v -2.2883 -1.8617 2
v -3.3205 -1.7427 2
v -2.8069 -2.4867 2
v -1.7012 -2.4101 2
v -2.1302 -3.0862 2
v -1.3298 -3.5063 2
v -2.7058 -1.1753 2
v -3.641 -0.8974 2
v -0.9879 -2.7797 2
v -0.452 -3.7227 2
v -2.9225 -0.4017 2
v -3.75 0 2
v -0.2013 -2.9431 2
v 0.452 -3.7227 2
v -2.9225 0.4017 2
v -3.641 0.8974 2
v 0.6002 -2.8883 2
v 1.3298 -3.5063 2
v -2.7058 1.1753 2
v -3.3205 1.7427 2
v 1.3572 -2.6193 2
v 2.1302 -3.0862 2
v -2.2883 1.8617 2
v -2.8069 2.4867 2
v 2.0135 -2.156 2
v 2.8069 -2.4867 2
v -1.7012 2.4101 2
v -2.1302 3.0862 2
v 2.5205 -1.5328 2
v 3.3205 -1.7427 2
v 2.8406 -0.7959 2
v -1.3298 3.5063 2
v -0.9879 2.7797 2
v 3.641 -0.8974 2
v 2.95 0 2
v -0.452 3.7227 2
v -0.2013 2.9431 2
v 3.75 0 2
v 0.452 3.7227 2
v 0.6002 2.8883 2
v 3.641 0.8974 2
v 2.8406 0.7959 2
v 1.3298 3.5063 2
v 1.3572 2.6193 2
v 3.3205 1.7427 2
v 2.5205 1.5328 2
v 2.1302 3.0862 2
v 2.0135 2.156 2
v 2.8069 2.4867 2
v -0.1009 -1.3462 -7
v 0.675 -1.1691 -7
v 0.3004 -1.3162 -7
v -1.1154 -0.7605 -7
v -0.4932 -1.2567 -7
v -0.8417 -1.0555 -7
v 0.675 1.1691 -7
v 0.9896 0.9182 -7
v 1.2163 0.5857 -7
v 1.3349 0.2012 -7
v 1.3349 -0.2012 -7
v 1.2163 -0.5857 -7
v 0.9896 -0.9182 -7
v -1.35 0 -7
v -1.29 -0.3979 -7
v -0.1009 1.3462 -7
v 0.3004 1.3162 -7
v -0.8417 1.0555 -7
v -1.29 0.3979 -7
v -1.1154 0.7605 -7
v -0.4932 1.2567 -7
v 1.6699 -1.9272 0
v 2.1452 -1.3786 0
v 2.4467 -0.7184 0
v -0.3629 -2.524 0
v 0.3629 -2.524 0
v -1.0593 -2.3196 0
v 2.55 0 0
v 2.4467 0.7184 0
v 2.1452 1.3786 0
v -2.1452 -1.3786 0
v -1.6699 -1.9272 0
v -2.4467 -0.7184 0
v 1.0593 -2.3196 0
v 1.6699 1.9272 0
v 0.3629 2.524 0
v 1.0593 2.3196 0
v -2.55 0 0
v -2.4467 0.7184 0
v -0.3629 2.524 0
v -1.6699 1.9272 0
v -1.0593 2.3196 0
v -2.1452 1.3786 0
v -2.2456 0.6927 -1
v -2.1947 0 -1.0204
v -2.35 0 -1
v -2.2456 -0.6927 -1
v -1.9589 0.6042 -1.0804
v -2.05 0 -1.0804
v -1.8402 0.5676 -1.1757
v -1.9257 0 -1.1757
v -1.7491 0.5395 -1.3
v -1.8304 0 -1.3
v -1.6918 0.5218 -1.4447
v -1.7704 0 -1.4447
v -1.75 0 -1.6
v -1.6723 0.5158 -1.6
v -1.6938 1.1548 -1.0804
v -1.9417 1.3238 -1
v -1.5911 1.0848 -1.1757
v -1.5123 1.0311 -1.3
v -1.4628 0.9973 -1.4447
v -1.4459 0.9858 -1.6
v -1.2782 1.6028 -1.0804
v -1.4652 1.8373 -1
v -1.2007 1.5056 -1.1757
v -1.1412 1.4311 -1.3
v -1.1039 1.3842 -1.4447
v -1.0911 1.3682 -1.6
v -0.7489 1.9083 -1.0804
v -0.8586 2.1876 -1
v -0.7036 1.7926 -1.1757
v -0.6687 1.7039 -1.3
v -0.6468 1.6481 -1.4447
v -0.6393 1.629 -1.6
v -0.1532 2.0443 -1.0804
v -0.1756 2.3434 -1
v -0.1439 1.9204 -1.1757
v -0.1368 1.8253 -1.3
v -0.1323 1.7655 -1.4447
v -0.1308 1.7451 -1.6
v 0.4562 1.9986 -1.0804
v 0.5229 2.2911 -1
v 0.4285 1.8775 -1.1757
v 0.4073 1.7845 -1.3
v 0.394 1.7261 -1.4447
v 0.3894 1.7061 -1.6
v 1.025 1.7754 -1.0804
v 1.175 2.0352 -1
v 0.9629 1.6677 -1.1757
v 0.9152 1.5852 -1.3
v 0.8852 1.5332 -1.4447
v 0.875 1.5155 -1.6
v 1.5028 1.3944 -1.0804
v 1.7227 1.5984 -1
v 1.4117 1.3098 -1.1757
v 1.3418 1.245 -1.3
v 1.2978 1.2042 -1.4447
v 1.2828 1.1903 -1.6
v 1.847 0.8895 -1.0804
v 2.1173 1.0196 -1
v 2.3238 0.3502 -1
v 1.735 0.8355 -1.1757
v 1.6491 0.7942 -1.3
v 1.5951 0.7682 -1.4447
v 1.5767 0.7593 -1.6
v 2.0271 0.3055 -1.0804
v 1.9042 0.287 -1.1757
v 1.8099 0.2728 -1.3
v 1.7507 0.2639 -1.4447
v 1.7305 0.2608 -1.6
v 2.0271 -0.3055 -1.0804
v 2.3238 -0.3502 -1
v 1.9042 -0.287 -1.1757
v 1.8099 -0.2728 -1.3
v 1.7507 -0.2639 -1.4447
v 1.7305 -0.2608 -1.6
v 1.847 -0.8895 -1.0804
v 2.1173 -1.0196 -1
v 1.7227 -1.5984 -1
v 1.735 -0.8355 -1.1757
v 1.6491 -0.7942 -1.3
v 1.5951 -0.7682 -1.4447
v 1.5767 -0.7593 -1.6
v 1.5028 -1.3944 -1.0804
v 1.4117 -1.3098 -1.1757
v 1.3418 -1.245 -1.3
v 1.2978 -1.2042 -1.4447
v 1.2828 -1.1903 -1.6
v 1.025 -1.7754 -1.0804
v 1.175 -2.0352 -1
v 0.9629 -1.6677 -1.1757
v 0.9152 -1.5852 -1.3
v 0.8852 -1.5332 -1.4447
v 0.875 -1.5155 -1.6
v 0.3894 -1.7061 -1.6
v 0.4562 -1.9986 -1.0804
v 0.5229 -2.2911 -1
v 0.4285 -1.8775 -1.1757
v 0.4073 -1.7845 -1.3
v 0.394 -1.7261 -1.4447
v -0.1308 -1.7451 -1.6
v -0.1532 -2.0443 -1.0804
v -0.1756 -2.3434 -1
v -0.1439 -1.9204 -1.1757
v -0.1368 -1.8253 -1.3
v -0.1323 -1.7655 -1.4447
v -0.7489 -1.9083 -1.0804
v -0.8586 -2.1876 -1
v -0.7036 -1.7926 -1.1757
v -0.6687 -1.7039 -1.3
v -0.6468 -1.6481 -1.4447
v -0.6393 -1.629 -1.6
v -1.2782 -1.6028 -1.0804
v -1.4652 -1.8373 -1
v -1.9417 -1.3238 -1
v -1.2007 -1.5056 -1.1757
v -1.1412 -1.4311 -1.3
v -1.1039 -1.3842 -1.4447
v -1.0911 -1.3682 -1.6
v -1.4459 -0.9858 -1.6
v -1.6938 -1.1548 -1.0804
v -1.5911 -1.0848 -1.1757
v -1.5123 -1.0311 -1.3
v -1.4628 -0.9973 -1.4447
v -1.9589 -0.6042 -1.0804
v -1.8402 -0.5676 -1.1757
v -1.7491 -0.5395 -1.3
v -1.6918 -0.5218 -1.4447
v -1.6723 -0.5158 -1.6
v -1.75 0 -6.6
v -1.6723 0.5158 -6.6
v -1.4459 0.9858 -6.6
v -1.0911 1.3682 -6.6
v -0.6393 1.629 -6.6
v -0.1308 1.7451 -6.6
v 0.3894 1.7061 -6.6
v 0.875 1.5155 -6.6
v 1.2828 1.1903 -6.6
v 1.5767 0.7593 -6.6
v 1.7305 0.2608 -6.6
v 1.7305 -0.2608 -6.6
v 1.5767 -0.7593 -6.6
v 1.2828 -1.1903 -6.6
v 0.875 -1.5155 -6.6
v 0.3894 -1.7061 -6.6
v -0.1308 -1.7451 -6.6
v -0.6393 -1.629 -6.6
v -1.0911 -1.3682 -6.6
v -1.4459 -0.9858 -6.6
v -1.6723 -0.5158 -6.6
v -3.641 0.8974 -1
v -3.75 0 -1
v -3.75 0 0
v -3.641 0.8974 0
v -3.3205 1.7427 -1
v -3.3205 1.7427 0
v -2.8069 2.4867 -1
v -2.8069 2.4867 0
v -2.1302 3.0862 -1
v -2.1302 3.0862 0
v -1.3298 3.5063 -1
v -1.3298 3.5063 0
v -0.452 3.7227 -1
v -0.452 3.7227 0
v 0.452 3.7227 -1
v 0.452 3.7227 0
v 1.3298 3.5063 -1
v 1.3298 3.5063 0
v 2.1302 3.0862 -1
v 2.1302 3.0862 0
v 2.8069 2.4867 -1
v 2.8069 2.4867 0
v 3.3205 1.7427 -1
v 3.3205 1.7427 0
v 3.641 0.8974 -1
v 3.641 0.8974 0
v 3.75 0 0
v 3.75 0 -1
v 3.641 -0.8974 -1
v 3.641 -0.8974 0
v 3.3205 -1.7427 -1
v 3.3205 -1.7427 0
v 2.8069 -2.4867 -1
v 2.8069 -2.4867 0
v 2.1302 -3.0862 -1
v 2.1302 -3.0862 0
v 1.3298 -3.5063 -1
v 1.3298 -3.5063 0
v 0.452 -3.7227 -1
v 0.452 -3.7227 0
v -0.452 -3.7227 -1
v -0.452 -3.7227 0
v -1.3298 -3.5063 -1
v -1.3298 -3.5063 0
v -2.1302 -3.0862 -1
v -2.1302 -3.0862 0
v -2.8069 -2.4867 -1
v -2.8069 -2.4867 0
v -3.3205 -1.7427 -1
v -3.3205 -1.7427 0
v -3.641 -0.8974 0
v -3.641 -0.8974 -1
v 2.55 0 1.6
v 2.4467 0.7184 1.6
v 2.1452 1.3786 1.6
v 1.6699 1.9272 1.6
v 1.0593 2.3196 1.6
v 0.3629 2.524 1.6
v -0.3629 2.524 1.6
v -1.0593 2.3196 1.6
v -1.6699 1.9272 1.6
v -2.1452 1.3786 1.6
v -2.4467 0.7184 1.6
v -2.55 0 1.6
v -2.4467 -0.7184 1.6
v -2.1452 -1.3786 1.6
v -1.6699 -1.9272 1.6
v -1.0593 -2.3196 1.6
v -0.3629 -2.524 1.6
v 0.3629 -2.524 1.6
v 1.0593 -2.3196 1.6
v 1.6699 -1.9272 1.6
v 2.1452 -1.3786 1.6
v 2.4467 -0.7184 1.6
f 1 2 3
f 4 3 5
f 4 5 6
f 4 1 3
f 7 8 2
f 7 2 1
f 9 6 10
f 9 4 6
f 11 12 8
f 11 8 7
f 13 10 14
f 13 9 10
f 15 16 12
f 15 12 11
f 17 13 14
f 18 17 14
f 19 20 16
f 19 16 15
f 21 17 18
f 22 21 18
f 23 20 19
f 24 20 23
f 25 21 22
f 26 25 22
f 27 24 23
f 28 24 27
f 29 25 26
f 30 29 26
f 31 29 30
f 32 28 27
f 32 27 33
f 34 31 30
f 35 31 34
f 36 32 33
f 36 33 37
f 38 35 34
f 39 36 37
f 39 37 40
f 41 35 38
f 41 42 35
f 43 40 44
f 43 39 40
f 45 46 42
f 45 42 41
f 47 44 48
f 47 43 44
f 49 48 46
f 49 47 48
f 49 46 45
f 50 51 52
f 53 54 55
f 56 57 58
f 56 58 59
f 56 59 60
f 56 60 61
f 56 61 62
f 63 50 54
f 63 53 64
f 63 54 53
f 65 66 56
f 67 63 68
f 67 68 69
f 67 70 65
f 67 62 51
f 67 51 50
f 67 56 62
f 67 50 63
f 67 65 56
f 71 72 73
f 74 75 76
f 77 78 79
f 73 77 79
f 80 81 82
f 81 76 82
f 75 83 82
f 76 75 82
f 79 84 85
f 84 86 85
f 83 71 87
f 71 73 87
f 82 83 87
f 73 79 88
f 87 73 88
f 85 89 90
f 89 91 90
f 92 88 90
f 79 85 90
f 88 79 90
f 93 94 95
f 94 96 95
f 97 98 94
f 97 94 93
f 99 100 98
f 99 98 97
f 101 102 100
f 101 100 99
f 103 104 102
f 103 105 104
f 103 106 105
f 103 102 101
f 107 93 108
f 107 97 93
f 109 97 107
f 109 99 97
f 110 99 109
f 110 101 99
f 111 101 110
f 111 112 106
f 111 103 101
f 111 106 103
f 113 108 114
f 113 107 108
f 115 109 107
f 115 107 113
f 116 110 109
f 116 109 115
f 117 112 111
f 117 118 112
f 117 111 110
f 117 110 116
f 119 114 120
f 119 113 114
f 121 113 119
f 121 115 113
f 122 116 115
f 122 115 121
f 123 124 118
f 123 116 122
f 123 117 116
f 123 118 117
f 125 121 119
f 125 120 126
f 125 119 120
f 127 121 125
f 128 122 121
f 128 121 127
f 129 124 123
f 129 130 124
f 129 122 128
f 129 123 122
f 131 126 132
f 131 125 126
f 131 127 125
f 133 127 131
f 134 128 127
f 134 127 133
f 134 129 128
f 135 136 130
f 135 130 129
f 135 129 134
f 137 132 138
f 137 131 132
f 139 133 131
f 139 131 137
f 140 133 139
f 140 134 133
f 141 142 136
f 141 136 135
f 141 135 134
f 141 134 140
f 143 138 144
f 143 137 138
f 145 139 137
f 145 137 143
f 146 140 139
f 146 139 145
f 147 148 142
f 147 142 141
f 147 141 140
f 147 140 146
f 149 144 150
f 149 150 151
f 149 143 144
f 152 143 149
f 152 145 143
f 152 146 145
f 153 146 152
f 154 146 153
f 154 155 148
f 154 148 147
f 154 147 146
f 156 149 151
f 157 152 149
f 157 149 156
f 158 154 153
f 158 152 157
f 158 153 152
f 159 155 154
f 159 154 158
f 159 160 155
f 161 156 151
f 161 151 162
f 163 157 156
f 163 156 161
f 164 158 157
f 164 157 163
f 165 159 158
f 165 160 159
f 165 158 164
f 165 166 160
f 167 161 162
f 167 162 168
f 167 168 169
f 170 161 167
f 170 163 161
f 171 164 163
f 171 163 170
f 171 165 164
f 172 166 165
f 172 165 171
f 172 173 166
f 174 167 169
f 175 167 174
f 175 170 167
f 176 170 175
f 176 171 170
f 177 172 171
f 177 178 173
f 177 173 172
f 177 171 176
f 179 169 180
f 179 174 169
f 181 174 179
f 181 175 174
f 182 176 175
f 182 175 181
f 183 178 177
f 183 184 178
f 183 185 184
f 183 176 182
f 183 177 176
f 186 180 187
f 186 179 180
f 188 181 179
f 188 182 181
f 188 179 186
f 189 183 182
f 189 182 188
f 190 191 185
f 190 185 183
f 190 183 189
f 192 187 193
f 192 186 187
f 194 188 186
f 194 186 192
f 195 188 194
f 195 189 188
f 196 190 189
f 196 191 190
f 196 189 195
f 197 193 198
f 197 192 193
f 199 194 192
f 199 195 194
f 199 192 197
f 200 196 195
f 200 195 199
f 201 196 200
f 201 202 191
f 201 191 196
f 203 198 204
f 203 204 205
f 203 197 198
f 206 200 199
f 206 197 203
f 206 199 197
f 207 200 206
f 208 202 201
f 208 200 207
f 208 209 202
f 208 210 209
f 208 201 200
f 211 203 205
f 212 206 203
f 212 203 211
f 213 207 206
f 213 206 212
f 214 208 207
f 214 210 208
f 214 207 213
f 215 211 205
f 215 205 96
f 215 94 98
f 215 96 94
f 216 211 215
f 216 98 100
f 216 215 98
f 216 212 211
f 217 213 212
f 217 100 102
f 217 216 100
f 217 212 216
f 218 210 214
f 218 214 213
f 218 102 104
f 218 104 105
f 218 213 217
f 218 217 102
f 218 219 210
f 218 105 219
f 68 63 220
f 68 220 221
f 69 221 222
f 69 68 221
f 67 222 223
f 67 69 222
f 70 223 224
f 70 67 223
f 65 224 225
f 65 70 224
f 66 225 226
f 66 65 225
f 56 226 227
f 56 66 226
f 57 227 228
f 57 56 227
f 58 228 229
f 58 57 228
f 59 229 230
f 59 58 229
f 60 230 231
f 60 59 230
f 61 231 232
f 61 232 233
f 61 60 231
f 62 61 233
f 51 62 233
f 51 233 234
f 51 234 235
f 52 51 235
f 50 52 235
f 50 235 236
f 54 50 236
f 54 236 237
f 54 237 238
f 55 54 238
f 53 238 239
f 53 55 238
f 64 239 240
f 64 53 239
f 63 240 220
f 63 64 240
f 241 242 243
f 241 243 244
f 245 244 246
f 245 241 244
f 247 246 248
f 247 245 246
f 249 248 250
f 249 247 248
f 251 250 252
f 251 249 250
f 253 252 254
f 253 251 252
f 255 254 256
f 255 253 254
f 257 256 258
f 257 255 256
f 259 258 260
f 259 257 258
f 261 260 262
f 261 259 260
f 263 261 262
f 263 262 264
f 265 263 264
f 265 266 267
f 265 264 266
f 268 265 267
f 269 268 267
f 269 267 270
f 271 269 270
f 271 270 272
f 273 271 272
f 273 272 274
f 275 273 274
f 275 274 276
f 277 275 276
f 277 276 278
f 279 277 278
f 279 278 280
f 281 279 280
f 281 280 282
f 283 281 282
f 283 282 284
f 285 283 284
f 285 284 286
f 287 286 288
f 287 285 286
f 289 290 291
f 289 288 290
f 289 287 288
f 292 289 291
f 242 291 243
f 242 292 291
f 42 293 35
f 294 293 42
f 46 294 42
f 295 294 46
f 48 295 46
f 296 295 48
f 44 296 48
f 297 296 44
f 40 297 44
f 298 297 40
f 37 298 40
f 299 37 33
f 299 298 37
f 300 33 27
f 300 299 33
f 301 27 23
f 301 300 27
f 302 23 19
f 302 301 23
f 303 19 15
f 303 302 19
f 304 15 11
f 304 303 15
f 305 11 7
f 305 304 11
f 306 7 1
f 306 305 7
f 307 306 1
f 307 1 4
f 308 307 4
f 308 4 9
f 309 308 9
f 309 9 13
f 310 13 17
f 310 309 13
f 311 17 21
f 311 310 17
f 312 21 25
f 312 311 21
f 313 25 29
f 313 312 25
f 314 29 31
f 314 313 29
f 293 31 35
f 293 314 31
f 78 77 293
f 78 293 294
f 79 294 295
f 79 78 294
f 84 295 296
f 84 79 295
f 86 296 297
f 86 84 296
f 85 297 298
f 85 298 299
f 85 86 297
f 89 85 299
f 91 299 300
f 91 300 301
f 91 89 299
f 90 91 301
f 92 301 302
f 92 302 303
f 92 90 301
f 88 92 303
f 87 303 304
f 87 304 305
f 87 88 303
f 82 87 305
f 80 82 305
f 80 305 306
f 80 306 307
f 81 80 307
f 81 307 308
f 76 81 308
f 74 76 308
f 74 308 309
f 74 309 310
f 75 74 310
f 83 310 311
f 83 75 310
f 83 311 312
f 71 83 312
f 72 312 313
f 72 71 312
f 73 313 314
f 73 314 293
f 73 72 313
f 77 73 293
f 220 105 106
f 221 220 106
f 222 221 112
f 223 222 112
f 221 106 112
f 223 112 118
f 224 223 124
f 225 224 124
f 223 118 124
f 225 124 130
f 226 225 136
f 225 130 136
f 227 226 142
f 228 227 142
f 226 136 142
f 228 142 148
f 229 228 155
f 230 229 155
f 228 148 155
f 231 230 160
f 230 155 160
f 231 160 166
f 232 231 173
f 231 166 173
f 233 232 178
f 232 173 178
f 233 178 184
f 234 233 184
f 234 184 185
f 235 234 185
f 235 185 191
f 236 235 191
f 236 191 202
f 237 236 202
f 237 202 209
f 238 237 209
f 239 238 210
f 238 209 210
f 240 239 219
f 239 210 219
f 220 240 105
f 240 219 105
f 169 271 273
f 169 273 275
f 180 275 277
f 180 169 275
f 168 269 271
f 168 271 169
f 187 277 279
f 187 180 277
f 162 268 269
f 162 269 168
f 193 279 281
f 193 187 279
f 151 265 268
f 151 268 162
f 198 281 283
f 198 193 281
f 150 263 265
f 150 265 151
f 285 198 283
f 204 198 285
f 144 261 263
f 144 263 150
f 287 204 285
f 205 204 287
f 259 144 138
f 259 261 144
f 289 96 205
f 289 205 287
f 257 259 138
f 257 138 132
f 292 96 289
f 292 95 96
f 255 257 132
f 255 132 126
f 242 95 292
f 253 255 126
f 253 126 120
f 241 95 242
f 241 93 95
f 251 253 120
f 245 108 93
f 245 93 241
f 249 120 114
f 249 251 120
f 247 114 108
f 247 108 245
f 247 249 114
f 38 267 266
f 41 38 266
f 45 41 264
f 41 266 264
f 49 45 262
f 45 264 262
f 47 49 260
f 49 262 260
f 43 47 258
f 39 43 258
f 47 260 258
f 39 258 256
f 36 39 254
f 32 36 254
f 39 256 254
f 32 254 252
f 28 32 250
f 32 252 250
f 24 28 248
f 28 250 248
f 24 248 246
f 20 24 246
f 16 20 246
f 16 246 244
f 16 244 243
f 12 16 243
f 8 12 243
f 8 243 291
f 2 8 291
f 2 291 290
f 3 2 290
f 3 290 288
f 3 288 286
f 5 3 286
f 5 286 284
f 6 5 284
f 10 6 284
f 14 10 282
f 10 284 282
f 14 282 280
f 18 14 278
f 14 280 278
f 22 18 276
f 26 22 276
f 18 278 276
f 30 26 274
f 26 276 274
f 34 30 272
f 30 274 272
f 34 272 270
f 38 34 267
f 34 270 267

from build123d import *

# Parameters (mm, degrees)
ESQUISSE1_R        = 3.75
ESQUISSE1_R_2      = 2.55
BOSS_EXTRU_1_DEPTH = 2
BOSS_EXTRU_2_START = 1
ESQUISSE2_R        = 3.75
BOSS_EXTRU_2_DEPTH = 1
ESQUISSE3_R        = 1.75
BOSS_EXTRU_3_DEPTH = 6
CONG_1_R           = 0.6
CHANFREIN1_SIZE    = 0.4
CHANFREIN2_SIZE    = 0.4


with BuildPart() as part:
    # Esquisse1 → Boss.-Extru.1 (new body)
    with BuildSketch(Plane.XY):
        Circle(ESQUISSE1_R)
        Circle(ESQUISSE1_R_2, mode=Mode.SUBTRACT)
    extrude(amount=BOSS_EXTRU_1_DEPTH)

    # Esquisse2 → Boss.-Extru.2 (add)
    with BuildSketch(Plane(origin=(0, 0, 0), x_dir=(-1, 0, 0), z_dir=(0, 0, -1)).offset(BOSS_EXTRU_2_START)):
        Circle(ESQUISSE2_R)
    extrude(amount=-BOSS_EXTRU_2_DEPTH)

    # Esquisse3 → Boss.-Extru.3 (add)
    with BuildSketch(Plane(origin=(0, 0, -1), x_dir=(-1, 0, 0), z_dir=(0, 0, -1))):
        Circle(ESQUISSE3_R)
    extrude(amount=BOSS_EXTRU_3_DEPTH)

    # Congé1
    cong_1_edges = [part.edges().sort_by_distance(p)[0] for p in [
        (1.75, 0, -1),
    ]]
    fillet(cong_1_edges, radius=CONG_1_R)

    # Chanfrein1
    chanfrein1_edges = [part.edges().sort_by_distance(p)[0] for p in [
        (1.75, 0, -7),
    ]]
    chamfer(chanfrein1_edges, length=CHANFREIN1_SIZE)

    # Chanfrein2
    chanfrein2_edges = [part.edges().sort_by_distance(p)[0] for p in [
        (-2.55, 0, 2),
    ]]
    chamfer(chanfrein2_edges, length=CHANFREIN2_SIZE)


solid = part.part
